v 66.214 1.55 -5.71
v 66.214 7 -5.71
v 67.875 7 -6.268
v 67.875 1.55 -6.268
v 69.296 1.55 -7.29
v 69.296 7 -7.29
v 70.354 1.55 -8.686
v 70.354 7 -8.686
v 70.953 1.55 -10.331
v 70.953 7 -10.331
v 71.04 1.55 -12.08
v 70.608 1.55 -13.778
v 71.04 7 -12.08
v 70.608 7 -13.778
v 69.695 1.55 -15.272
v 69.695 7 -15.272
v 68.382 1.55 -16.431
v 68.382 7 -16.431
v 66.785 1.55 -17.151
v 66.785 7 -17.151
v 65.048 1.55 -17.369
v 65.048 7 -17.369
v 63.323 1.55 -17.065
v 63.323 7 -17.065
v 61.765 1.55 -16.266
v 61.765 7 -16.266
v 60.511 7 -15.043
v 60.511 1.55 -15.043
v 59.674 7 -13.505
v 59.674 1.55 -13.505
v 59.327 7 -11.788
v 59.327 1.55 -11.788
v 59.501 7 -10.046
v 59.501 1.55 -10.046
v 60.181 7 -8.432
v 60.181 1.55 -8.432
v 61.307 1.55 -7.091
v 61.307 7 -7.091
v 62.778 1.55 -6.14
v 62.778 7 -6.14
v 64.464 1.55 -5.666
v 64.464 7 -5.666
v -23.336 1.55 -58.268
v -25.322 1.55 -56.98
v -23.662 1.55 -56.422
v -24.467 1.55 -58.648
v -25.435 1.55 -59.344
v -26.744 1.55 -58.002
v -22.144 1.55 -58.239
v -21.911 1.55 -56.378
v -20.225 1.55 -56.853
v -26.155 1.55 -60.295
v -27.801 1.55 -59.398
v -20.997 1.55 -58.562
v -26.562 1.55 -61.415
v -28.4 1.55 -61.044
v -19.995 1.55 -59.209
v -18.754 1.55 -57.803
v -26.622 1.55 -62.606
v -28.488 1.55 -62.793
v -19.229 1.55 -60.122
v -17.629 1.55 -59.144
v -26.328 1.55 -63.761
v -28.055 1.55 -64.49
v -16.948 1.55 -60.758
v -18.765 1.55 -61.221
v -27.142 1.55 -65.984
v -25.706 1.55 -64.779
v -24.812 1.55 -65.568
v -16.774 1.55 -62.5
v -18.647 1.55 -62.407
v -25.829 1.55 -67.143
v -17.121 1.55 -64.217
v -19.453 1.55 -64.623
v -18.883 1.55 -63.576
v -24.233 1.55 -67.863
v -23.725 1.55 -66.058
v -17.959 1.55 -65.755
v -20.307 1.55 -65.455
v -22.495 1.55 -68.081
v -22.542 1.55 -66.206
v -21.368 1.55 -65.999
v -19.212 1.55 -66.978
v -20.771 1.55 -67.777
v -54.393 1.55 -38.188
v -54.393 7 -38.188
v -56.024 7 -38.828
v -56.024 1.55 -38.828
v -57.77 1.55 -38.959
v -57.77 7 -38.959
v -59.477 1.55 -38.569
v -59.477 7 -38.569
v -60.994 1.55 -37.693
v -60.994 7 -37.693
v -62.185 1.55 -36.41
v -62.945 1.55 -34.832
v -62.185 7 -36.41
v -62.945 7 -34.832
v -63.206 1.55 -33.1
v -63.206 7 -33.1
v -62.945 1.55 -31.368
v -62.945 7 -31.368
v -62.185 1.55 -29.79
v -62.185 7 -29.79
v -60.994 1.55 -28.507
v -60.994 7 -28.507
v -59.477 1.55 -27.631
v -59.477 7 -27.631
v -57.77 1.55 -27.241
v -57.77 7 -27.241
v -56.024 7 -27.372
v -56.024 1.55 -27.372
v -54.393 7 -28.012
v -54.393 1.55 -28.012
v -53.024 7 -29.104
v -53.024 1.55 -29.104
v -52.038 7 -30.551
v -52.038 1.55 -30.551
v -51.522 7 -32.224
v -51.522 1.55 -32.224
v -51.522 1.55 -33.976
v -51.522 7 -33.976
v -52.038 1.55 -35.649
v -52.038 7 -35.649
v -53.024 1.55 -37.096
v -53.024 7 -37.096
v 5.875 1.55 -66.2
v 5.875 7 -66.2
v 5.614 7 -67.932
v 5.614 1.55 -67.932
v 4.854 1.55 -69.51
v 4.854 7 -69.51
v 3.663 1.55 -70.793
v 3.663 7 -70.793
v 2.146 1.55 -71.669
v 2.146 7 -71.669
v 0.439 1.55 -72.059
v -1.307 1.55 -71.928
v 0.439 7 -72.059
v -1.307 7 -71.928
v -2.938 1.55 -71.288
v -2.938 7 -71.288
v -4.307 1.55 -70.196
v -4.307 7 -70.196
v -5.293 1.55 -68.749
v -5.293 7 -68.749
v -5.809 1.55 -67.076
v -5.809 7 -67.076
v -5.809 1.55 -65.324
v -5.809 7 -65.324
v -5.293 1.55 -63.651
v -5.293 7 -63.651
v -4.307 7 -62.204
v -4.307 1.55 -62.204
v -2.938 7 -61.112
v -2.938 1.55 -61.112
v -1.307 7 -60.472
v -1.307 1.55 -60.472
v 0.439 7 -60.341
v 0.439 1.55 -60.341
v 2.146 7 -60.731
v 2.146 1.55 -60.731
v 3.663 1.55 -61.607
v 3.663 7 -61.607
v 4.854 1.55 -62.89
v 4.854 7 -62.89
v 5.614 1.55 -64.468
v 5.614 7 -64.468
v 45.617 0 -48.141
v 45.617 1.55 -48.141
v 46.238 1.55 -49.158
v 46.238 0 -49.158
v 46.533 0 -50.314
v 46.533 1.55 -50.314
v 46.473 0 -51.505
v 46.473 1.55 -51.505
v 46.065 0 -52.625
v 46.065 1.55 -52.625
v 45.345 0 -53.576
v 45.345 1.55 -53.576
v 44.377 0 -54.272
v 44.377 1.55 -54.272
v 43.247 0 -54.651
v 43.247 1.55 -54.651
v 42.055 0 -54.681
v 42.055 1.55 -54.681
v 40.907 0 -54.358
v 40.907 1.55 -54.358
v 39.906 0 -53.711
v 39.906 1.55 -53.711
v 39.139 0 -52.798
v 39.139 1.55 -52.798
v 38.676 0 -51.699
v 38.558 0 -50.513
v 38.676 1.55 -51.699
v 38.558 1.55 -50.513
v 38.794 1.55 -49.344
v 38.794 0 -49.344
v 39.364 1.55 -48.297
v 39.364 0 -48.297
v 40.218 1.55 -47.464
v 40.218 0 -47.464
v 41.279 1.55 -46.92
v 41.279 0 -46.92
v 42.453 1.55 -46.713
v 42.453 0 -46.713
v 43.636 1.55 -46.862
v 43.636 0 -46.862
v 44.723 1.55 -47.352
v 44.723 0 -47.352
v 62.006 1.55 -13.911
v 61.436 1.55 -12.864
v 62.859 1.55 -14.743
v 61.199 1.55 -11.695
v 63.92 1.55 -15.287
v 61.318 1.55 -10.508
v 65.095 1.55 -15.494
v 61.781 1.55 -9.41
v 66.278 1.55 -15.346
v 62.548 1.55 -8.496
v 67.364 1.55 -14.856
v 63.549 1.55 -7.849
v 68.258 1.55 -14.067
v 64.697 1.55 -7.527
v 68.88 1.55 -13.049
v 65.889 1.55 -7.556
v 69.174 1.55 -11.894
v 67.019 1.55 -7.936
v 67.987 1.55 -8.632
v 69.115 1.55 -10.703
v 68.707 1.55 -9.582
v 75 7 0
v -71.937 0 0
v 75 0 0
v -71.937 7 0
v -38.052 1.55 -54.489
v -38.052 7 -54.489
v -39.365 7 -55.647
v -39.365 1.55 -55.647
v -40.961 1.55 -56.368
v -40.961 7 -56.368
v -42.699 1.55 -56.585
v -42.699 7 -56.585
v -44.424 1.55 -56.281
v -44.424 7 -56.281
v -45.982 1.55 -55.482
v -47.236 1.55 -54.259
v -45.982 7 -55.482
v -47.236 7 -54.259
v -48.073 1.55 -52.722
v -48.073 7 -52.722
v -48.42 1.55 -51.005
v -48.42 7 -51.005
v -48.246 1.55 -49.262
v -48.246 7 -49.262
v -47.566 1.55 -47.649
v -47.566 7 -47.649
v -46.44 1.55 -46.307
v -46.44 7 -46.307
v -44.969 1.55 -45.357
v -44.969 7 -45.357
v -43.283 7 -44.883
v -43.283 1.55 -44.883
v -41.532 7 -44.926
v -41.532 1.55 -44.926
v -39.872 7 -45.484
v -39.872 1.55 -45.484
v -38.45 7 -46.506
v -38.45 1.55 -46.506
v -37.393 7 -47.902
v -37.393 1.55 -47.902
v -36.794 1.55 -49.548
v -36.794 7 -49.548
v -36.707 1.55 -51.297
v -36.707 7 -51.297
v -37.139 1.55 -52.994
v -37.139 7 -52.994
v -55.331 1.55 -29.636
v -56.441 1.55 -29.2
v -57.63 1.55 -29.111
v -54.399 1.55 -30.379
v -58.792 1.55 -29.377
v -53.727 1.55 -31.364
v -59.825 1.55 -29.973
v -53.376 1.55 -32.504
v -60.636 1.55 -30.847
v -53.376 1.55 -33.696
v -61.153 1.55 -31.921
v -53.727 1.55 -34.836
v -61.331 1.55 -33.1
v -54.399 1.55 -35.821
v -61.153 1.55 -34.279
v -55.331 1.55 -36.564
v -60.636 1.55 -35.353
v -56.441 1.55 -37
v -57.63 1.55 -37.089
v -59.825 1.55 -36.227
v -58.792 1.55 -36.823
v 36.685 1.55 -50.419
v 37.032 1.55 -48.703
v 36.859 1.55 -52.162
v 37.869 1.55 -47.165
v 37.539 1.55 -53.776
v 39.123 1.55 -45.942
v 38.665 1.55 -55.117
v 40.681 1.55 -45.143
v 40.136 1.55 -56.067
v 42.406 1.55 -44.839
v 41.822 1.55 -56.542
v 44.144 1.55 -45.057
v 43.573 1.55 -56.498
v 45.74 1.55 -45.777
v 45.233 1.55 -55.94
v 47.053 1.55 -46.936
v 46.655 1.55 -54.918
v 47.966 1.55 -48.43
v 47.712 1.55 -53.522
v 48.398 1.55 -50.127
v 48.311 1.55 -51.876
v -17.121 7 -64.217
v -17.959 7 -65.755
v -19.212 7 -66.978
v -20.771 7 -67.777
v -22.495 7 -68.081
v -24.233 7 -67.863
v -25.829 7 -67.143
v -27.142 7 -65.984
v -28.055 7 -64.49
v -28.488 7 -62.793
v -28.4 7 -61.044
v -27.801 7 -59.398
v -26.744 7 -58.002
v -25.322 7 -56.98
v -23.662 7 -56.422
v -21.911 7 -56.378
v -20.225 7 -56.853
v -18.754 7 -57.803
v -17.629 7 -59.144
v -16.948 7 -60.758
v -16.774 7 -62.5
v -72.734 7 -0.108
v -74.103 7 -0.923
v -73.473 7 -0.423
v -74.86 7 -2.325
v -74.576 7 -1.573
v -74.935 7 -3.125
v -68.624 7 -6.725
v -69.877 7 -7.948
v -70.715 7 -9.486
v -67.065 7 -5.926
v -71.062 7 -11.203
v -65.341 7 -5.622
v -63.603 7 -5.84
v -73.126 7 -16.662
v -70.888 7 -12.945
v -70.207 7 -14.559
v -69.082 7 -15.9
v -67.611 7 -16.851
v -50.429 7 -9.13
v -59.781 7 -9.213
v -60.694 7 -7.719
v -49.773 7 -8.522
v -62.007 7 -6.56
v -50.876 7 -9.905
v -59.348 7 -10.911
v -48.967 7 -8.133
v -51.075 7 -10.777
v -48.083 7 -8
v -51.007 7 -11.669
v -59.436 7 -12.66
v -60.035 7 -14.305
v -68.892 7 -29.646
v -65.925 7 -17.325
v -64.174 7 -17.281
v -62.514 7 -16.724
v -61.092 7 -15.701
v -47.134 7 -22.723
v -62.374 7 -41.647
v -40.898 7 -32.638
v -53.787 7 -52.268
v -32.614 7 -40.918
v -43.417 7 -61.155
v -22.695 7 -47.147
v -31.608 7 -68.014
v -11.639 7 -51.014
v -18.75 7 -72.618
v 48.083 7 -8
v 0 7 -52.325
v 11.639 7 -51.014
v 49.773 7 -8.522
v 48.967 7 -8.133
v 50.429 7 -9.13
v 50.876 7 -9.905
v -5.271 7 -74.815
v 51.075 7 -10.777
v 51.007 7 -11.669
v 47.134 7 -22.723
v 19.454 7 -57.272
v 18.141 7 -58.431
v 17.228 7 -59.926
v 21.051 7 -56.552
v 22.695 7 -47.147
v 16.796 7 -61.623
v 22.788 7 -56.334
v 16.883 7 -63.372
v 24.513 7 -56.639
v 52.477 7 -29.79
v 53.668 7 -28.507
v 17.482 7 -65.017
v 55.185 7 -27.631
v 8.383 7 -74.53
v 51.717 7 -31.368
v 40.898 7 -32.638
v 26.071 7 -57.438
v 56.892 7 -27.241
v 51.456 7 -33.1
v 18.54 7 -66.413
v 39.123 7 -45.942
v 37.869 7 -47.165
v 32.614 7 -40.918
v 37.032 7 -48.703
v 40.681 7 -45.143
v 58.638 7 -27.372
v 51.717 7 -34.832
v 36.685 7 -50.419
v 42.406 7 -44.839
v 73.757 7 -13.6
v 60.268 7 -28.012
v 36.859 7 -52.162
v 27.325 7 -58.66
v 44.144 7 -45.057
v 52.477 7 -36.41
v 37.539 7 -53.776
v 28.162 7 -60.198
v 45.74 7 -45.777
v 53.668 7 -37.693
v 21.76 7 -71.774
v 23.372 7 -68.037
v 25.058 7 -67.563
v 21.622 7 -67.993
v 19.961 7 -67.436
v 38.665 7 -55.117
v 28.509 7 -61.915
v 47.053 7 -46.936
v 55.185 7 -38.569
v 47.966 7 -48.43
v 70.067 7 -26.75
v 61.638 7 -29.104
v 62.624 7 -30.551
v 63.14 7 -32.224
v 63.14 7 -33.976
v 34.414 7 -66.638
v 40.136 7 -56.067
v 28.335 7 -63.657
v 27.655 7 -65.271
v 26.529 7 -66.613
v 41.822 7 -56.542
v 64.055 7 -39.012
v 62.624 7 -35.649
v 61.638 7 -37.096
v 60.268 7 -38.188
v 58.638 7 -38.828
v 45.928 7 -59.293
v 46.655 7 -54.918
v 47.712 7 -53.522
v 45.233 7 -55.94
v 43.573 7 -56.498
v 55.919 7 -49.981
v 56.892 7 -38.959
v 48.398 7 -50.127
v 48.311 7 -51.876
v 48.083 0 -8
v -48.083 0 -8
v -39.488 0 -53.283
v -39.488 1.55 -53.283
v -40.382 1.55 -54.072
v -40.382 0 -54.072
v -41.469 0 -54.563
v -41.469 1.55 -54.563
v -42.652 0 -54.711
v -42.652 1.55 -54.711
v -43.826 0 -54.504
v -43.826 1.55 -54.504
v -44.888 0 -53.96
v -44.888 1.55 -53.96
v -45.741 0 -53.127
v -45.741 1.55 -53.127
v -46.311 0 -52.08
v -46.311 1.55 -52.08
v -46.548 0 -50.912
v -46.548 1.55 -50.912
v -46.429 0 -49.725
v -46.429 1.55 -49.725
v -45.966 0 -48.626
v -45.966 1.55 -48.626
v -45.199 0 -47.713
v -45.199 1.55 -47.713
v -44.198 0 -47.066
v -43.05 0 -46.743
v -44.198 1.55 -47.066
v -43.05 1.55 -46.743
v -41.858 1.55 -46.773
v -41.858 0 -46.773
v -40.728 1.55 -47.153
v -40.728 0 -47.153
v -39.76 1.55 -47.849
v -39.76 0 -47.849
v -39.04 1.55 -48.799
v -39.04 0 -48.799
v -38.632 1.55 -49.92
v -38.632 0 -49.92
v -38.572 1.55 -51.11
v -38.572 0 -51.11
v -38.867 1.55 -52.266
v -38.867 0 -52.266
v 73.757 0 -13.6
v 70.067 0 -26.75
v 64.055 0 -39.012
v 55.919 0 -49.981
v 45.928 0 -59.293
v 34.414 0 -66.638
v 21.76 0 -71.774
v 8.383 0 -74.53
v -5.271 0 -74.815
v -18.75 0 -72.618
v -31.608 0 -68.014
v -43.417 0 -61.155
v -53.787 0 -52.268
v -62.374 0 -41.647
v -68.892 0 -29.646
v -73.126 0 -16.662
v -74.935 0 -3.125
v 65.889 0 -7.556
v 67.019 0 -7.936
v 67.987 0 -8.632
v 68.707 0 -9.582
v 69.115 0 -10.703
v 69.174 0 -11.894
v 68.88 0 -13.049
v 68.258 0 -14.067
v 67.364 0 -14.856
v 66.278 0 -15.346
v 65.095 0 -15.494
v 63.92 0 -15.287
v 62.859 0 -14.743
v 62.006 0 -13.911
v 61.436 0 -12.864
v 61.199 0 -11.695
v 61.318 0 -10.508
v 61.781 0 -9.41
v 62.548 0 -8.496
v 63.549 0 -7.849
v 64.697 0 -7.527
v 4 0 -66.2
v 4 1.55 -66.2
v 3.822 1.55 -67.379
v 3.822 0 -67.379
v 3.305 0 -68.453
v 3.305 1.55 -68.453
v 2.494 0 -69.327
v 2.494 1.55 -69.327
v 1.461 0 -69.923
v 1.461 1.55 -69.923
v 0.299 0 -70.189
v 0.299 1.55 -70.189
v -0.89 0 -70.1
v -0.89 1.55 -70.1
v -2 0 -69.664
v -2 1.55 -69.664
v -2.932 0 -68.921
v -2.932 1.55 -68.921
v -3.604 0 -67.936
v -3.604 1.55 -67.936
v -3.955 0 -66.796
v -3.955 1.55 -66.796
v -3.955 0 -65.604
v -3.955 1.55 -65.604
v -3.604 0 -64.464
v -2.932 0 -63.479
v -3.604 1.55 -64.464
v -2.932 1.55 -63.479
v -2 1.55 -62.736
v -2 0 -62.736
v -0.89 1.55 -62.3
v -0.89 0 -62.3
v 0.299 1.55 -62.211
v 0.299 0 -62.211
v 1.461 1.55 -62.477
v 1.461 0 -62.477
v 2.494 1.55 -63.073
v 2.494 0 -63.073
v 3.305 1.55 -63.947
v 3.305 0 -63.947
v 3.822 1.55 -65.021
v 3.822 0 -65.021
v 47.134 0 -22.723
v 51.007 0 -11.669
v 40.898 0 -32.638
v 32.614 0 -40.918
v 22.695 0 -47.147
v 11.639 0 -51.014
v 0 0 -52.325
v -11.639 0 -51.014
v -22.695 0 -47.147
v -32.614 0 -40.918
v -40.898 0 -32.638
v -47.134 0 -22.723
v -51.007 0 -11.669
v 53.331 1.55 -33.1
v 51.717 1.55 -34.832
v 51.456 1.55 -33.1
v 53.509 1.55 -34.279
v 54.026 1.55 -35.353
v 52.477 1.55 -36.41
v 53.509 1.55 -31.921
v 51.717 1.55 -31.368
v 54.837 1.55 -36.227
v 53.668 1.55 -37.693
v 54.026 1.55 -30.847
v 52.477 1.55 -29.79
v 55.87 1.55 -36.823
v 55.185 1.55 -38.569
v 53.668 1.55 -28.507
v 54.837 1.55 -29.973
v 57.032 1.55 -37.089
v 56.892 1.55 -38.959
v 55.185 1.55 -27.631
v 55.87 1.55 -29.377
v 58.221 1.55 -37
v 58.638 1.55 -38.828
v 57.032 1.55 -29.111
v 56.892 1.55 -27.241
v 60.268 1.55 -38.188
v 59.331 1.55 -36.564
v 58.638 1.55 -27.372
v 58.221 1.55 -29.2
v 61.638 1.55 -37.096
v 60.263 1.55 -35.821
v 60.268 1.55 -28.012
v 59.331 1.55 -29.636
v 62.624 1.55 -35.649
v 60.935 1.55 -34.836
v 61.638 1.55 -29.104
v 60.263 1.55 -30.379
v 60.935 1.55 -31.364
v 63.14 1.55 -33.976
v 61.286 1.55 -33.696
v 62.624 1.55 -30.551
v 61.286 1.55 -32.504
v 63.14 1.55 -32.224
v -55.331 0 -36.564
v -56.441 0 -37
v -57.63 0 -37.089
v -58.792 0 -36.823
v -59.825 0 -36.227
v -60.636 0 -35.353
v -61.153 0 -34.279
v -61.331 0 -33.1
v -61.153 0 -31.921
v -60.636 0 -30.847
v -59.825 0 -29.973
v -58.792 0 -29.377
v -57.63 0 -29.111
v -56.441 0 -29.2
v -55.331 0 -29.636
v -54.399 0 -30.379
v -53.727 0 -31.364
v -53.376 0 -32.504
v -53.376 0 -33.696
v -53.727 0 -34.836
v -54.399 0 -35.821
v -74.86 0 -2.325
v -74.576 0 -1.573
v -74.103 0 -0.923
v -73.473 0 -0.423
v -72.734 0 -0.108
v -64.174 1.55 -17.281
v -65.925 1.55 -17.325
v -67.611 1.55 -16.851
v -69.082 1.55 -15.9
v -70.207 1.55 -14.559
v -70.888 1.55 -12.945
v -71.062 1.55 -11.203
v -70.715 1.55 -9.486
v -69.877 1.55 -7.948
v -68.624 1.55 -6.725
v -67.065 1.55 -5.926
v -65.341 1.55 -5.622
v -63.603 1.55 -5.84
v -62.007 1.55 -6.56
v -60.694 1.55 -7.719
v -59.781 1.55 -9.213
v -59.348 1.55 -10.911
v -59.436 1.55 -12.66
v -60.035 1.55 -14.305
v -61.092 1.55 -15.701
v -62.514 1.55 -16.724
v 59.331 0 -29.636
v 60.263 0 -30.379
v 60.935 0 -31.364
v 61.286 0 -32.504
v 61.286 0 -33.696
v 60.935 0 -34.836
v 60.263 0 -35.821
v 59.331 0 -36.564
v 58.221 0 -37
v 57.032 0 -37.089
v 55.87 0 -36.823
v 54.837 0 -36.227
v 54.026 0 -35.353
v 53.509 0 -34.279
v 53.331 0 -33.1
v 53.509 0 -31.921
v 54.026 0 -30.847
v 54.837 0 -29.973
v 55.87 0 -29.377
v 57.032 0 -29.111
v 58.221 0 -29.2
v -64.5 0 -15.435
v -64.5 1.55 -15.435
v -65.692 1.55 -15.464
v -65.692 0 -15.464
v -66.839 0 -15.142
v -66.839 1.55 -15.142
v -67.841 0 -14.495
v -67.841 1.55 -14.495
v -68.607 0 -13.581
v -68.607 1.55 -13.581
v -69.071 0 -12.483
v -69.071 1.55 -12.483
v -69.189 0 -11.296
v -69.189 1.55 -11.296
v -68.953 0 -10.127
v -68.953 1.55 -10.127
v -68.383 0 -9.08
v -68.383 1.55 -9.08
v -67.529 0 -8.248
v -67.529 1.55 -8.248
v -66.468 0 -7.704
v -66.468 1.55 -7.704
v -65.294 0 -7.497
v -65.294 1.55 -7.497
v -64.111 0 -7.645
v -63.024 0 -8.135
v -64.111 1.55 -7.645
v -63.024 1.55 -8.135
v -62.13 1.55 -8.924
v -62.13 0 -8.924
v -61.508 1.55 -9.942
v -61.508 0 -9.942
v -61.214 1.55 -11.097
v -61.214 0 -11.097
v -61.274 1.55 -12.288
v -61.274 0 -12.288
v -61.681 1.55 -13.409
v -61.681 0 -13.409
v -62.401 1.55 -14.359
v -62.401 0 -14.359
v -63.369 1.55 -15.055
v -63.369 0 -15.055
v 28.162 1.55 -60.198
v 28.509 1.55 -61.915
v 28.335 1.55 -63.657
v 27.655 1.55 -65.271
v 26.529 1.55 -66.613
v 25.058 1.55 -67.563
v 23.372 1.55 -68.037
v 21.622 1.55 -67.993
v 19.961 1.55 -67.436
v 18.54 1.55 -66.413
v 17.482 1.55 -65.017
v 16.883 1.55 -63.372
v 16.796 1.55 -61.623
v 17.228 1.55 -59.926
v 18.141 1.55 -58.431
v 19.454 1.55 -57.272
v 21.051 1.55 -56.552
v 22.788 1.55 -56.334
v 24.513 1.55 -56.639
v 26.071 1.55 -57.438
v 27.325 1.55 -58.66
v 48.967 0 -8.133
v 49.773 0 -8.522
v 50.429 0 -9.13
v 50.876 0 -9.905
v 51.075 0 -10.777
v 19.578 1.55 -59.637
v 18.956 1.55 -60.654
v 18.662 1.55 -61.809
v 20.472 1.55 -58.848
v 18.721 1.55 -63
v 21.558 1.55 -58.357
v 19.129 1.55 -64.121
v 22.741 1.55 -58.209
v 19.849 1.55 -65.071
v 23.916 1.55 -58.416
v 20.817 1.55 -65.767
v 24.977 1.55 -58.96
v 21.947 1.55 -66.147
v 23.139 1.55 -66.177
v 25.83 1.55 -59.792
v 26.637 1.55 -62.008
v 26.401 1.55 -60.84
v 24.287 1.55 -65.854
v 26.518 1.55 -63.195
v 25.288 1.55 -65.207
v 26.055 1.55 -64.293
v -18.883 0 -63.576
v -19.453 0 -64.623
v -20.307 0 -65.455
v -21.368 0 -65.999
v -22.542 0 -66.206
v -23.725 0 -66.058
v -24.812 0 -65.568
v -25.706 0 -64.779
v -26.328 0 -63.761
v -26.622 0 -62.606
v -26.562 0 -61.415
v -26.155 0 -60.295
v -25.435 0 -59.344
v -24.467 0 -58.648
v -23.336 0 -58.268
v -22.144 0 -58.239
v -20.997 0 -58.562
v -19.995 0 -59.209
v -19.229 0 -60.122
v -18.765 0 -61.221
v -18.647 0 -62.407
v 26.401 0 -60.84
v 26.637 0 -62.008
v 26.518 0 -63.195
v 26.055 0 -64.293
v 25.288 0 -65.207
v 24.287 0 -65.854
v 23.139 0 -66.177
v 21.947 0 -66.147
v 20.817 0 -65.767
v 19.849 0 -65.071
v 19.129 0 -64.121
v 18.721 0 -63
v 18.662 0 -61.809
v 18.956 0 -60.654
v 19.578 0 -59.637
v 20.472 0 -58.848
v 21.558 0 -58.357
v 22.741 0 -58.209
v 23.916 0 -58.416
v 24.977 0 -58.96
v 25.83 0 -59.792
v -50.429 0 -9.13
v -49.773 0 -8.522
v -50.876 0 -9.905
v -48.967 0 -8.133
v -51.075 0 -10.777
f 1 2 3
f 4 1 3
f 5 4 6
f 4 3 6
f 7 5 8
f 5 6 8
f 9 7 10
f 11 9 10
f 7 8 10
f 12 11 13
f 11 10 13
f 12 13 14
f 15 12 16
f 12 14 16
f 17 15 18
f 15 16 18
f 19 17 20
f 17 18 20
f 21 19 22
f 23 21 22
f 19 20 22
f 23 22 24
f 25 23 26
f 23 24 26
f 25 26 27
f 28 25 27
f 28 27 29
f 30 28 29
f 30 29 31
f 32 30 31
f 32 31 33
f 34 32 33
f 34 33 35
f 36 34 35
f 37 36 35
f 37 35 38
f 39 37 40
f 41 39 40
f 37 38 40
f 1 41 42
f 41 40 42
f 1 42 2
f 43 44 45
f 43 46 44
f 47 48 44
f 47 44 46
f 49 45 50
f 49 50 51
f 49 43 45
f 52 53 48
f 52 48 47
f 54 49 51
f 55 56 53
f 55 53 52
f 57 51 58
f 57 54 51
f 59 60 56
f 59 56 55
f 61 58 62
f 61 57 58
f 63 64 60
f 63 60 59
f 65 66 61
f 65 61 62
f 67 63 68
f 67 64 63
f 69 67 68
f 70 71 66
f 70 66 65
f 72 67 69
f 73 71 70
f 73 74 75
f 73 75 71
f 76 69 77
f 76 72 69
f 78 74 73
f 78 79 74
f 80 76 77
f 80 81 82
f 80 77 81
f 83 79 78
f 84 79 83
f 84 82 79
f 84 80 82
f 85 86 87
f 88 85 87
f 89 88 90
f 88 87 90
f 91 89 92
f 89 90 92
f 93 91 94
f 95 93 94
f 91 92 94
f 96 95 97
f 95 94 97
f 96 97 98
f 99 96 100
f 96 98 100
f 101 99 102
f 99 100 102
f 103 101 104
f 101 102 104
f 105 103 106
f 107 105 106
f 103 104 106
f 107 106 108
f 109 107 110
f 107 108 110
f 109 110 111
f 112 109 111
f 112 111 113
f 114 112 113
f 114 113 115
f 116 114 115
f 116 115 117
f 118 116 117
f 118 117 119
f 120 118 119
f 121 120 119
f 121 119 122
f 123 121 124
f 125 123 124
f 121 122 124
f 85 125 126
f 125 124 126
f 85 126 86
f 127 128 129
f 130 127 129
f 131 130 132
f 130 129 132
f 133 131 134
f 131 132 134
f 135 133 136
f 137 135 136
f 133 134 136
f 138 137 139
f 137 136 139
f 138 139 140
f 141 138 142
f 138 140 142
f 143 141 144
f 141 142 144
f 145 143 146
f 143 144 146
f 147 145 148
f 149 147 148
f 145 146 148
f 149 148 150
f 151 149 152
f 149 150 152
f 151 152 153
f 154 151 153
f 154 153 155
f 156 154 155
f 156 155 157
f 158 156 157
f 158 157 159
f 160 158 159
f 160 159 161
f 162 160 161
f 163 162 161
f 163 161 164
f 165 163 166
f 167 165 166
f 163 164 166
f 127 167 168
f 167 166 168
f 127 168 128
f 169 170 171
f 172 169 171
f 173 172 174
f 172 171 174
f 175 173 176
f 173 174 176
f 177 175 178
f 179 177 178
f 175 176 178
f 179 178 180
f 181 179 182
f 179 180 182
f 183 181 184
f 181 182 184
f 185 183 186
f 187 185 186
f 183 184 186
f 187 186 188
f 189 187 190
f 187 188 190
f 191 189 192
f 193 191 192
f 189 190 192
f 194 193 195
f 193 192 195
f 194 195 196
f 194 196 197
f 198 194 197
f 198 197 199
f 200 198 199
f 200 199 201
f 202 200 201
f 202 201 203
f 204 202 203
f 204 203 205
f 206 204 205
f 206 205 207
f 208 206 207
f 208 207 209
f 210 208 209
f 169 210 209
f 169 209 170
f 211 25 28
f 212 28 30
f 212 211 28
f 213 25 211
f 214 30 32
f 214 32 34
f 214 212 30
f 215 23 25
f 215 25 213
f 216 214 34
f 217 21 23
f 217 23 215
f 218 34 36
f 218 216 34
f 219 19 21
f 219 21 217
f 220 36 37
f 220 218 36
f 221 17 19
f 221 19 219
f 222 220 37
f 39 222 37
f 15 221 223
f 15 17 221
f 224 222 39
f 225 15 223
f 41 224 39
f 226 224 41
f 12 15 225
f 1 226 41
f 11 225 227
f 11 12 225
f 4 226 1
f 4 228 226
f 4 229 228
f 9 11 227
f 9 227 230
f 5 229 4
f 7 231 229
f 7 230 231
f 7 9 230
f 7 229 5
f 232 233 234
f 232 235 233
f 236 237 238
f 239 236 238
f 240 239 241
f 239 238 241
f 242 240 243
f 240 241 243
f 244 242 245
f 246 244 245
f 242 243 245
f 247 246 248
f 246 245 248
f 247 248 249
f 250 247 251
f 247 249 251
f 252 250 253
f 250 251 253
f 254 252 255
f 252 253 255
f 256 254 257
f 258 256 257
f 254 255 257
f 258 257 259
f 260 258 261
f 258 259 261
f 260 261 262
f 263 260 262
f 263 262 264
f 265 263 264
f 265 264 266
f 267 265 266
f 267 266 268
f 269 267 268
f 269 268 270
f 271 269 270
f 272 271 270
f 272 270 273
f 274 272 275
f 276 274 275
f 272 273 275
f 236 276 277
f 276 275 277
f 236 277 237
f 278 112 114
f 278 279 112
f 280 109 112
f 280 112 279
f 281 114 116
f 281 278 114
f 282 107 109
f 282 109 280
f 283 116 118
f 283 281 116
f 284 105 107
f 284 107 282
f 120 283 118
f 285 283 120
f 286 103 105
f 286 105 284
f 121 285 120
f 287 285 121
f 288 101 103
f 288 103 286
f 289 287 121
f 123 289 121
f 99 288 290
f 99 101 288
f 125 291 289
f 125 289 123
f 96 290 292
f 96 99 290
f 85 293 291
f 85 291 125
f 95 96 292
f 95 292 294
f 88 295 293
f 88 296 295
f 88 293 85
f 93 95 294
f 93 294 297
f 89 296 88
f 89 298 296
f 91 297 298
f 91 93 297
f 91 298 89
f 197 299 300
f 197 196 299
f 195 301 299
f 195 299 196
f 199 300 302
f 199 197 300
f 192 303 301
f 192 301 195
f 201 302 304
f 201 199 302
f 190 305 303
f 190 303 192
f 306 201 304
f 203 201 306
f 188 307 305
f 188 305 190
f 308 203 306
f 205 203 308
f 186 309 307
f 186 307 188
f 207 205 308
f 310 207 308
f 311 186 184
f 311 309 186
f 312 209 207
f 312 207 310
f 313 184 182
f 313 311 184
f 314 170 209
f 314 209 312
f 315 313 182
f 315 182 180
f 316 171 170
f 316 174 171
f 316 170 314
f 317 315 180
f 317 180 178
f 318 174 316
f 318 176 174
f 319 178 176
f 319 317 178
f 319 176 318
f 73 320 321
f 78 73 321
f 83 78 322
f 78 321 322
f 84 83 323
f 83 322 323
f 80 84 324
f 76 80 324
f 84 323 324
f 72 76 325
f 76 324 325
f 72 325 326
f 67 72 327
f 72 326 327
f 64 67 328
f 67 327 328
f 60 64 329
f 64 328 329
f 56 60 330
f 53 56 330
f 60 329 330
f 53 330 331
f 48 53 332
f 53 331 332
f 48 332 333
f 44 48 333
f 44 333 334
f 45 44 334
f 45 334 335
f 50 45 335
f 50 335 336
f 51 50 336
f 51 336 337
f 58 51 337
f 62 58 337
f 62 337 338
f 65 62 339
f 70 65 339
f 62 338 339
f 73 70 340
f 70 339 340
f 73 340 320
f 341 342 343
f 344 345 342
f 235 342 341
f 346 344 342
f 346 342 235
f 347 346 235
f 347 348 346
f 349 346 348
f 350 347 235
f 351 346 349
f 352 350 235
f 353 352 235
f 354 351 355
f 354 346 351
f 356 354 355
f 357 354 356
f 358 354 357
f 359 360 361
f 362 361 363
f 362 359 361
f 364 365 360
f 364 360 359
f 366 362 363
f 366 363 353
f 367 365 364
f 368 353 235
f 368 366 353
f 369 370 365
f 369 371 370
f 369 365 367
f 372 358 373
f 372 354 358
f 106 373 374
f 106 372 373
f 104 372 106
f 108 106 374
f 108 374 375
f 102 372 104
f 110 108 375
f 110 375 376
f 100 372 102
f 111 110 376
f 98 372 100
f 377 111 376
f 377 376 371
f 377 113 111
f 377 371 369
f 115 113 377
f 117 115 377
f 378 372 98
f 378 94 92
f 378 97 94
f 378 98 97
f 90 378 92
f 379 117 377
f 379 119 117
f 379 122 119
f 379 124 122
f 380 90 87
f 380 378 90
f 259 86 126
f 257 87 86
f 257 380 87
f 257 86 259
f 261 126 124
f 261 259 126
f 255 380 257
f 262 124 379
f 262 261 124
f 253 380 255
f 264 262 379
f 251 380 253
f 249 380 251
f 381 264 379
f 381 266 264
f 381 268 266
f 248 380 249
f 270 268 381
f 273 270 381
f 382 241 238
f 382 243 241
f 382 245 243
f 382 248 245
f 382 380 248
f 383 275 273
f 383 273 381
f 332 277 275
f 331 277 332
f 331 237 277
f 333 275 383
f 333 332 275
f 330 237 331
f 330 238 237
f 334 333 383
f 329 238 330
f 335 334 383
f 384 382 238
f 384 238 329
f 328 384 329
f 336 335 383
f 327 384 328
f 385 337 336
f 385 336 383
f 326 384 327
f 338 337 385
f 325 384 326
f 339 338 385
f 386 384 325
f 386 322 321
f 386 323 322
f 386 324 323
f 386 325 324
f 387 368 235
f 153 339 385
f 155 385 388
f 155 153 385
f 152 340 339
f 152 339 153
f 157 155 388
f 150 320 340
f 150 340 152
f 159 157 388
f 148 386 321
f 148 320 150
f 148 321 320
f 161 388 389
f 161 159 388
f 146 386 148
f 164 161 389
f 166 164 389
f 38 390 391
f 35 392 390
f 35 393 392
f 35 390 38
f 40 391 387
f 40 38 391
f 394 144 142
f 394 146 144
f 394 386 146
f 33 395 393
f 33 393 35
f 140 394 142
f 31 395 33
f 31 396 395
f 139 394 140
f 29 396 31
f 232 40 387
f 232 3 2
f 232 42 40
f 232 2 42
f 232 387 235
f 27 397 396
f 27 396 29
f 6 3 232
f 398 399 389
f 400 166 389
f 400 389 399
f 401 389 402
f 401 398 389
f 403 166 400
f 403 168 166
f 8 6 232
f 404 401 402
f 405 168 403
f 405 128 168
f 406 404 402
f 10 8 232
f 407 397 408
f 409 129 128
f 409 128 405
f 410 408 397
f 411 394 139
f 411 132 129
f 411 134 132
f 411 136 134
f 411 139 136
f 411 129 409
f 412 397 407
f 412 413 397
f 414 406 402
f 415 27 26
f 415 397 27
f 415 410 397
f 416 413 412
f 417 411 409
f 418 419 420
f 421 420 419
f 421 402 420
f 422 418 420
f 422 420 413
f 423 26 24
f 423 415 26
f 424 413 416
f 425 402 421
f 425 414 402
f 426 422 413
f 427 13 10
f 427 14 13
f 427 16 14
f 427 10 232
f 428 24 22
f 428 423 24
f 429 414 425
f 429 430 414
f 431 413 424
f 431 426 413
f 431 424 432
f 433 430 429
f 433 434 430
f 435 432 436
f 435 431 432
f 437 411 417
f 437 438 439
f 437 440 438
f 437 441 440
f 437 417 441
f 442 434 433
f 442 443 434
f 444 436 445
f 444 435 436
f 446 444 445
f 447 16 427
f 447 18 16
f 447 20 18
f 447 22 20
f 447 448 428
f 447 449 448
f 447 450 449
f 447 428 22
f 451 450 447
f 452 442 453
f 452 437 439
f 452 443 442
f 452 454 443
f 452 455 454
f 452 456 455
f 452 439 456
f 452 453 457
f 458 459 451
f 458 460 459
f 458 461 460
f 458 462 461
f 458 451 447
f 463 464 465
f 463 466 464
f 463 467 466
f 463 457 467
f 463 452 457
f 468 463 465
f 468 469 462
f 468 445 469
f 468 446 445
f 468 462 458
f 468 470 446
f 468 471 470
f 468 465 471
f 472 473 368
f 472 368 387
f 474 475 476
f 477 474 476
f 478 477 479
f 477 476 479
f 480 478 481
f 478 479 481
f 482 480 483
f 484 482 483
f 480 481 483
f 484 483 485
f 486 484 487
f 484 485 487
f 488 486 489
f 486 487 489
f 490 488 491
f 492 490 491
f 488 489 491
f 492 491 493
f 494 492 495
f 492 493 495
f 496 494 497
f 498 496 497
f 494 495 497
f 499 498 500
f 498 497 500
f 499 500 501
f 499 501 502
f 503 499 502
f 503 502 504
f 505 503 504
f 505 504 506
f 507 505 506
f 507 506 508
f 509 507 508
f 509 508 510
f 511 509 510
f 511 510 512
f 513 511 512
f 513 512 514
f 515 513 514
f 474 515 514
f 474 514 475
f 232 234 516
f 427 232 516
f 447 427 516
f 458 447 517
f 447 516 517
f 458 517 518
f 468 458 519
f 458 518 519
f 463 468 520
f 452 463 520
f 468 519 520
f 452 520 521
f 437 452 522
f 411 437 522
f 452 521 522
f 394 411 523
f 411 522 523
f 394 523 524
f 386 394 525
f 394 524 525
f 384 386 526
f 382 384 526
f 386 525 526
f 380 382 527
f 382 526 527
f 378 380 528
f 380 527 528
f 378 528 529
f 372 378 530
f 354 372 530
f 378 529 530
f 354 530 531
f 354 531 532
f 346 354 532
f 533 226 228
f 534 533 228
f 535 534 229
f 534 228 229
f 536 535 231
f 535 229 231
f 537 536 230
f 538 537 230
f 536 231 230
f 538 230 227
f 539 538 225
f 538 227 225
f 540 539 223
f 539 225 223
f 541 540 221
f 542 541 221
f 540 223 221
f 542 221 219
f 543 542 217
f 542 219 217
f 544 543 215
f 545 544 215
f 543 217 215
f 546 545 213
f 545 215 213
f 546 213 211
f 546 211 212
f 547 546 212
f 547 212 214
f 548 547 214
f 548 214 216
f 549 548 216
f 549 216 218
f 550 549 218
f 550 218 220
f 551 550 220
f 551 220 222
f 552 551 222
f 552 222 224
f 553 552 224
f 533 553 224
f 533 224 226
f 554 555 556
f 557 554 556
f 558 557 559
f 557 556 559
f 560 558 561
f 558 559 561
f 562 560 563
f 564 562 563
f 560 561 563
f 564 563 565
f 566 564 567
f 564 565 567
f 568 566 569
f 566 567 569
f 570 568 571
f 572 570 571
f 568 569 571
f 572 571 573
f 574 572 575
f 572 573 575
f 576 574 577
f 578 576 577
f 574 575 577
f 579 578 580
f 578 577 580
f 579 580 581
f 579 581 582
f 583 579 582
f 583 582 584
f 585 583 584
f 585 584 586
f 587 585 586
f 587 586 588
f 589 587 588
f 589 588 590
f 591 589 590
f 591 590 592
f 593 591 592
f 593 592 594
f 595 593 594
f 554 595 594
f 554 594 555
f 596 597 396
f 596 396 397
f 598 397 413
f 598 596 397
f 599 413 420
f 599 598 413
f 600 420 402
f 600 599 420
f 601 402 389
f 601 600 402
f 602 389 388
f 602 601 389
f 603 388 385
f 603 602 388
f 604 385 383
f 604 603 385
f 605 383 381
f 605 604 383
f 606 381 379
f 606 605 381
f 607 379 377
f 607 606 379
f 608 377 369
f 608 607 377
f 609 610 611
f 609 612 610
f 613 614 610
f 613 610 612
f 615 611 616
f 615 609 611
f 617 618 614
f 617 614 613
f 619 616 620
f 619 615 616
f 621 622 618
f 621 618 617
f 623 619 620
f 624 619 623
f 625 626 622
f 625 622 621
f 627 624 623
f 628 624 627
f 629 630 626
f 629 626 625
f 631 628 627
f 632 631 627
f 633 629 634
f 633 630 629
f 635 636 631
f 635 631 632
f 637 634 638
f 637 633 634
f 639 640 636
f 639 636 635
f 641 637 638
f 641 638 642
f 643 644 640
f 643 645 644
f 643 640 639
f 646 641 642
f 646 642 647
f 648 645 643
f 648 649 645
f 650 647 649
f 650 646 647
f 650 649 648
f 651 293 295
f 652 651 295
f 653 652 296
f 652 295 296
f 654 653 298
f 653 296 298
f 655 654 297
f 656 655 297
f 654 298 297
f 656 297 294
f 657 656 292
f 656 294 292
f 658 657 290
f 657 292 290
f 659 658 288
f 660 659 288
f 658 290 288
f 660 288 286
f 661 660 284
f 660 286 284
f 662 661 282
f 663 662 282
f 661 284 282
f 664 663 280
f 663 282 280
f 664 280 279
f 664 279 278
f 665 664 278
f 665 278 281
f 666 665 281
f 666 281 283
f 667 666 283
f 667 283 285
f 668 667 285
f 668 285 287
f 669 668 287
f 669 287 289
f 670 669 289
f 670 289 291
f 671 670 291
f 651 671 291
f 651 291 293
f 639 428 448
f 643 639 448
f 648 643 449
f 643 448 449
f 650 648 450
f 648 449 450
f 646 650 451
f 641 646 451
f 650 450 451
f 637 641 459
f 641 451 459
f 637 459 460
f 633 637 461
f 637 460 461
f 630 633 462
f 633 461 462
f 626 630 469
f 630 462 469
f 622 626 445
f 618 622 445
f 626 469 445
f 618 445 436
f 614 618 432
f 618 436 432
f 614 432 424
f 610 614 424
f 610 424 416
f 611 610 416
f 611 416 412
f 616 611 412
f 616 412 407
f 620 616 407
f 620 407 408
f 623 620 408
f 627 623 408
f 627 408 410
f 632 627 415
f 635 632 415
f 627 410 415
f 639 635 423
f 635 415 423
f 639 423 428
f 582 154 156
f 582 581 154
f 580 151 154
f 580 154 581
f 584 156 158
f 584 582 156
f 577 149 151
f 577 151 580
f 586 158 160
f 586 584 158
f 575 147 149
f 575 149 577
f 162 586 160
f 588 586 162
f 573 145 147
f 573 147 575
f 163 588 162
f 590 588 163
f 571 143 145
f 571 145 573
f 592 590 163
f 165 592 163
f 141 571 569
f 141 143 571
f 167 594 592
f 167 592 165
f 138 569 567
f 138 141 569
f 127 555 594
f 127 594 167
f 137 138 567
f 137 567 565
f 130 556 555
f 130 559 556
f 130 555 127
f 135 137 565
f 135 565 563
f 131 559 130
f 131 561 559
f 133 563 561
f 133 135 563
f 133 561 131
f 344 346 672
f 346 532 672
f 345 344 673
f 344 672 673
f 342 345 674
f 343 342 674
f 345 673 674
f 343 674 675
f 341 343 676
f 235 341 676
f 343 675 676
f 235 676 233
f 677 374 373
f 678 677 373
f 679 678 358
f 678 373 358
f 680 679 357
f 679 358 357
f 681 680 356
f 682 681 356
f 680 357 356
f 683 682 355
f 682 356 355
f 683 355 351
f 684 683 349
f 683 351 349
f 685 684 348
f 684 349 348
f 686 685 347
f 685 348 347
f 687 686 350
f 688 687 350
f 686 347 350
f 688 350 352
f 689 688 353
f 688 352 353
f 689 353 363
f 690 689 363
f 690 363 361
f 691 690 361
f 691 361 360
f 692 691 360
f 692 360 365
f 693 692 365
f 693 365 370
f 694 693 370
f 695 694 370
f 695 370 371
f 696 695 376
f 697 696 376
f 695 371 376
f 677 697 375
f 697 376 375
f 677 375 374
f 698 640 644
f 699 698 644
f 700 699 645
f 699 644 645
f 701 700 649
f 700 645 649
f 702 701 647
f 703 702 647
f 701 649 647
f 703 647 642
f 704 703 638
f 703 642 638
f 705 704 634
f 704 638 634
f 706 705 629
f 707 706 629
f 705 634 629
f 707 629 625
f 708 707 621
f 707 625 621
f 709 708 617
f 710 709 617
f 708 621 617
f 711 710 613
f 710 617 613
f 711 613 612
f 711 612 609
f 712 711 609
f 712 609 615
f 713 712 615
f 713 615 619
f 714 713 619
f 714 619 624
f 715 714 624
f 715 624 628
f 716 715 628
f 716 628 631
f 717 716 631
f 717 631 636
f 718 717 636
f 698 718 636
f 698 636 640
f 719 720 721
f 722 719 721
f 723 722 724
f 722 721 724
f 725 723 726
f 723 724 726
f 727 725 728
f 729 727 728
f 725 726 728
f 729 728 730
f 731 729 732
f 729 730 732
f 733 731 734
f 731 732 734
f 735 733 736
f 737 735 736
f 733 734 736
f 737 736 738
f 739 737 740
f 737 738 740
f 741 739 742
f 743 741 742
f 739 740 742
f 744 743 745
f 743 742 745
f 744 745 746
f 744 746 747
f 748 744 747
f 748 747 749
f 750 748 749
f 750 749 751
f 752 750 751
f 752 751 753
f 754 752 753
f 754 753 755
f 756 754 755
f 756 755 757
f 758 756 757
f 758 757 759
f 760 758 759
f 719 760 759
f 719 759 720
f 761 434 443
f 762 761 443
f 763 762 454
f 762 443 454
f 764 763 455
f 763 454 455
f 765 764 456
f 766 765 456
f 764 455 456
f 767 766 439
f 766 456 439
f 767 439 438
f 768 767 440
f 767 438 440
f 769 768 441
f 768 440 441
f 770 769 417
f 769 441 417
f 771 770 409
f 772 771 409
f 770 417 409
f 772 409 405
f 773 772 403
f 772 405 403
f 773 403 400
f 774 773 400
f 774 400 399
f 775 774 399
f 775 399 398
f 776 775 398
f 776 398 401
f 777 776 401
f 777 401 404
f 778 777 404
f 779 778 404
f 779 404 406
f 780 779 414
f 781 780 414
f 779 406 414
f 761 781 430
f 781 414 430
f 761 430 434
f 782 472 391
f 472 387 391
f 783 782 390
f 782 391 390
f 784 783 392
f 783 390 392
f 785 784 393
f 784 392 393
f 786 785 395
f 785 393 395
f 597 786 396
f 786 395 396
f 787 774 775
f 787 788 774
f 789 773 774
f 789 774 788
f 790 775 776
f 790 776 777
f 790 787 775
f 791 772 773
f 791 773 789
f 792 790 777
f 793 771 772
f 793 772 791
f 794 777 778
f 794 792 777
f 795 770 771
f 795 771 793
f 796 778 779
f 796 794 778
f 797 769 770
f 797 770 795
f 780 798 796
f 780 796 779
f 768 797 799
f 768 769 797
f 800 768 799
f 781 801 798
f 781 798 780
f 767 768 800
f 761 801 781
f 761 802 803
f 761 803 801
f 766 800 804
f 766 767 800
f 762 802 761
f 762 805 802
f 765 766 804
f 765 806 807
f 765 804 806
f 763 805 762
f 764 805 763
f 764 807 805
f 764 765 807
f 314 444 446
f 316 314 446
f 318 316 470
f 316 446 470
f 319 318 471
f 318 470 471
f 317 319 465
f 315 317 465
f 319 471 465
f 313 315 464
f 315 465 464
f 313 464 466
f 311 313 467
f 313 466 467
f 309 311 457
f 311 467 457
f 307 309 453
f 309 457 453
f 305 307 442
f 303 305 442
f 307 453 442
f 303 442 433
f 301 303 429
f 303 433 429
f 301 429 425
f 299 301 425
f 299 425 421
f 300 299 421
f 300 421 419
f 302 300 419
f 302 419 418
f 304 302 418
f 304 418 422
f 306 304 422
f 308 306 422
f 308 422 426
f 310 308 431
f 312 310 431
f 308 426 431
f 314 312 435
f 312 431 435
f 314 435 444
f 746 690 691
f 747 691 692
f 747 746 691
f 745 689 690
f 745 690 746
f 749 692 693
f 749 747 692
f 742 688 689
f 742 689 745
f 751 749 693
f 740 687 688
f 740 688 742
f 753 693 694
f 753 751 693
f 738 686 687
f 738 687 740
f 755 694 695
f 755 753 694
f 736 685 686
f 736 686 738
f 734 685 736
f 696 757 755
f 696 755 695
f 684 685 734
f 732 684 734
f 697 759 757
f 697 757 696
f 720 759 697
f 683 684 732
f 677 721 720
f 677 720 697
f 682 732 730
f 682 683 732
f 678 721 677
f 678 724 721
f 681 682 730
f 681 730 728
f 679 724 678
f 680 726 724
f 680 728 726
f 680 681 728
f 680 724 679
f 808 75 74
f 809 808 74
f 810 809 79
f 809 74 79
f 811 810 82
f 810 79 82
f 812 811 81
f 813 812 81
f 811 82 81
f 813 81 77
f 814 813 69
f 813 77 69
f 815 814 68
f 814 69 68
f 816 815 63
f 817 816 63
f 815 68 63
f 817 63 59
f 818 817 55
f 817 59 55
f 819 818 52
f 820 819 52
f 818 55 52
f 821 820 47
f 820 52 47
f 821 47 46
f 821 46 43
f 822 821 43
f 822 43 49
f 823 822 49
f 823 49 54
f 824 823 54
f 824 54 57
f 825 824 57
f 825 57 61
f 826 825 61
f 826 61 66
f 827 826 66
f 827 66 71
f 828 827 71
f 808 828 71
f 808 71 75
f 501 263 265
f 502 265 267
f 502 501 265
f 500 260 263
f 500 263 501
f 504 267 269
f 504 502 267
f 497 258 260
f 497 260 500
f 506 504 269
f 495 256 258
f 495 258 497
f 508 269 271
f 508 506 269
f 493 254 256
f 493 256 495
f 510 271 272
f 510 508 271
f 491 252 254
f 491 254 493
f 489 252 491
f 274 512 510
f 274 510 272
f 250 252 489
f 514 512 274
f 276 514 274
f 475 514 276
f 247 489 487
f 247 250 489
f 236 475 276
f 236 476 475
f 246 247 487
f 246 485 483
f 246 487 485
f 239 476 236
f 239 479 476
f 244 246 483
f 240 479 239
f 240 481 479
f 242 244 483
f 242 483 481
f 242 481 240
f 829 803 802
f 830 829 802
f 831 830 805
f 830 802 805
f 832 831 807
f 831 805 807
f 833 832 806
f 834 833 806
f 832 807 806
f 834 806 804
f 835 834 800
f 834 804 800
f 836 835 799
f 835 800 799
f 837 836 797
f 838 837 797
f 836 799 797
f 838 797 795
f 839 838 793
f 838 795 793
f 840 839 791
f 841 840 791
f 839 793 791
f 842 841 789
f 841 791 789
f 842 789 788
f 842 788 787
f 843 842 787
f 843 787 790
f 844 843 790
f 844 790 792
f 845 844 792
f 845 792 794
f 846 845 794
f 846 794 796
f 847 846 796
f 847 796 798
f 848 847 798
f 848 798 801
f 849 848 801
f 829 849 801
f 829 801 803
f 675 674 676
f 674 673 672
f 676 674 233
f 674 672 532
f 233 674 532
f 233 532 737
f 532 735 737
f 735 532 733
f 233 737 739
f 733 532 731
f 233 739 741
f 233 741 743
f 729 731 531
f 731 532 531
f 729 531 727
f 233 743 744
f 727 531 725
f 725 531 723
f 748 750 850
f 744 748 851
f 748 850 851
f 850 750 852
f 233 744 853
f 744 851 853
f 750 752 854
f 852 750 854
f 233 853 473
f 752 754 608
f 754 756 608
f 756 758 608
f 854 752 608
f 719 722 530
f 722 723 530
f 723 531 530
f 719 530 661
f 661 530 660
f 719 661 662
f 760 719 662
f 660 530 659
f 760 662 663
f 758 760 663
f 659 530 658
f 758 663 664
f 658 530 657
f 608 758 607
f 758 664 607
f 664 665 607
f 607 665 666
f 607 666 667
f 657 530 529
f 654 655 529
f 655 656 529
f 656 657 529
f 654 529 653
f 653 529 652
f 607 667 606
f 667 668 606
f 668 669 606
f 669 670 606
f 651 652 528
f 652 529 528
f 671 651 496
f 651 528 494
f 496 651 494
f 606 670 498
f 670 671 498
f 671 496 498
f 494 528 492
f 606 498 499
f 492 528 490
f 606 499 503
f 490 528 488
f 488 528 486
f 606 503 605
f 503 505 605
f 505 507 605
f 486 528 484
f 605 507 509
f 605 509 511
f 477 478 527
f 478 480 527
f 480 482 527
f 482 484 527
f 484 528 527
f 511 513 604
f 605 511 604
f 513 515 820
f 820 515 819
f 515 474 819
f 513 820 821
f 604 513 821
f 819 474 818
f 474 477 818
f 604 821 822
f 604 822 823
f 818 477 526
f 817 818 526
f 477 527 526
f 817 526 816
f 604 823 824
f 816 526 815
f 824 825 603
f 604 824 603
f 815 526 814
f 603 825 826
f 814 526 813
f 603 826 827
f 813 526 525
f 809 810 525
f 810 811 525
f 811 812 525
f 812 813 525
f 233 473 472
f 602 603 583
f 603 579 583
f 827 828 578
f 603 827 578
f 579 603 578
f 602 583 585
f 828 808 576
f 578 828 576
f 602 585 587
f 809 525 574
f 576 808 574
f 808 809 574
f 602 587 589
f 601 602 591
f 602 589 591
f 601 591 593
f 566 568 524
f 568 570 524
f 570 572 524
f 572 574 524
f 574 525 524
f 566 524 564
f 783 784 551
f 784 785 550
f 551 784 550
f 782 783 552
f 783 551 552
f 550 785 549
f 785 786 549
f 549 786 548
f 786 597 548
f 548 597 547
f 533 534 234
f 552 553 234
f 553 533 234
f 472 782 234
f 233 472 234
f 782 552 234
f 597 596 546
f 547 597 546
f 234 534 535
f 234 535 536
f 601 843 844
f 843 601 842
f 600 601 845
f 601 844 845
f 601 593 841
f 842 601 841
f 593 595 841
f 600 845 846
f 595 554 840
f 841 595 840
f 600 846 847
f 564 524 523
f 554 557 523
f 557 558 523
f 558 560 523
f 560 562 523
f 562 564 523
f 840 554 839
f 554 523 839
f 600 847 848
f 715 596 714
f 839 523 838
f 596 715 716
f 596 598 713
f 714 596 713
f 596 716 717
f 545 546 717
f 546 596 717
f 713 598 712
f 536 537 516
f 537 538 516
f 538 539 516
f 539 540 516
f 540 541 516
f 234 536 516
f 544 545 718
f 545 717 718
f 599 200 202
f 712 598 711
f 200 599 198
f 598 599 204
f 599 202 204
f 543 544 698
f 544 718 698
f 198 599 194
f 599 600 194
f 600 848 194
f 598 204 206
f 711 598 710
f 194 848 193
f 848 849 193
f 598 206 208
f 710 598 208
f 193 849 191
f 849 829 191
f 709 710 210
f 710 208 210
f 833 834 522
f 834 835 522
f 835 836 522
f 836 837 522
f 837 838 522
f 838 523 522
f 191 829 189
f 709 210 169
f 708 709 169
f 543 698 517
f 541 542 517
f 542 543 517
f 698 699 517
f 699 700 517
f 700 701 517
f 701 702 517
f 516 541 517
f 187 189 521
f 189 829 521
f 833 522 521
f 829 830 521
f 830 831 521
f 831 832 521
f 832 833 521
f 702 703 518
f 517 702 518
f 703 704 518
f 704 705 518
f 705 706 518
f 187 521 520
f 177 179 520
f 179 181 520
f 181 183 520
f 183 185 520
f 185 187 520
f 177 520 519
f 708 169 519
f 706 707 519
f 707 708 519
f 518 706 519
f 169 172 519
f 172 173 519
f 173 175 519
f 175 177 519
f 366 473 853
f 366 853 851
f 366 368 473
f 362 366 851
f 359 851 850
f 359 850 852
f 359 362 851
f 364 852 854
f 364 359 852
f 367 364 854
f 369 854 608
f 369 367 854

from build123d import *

# Parameters (mm, degrees)
SKETCH1_R           = 75
BOSS_EXTRUDE1_DEPTH = 7
SKETCH2_R           = 5.875
CUT_EXTRUDE1_DEPTH  = 5.45
SKETCH3_R           = 4
CUT_EXTRUDE2_DEPTH  = 2.55
CIRPATTERN1_COUNT   = 18
FILLET1_R           = 3


with BuildPart() as part:
    # Sketch1 → Boss-Extrude1 (new body)
    with BuildSketch(Plane(origin=(0, 0, 0), x_dir=(1, 0, 0), z_dir=(0, 1, 0))):
        Circle(SKETCH1_R)
        with BuildLine():
            Line((-51.709821359, 8), (51.709821359, 8))
            ThreePointArc((51.709821359, 8), (0, 52.325), (-51.709821359, 8))
        make_face(mode=Mode.SUBTRACT)
    extrude(amount=BOSS_EXTRUDE1_DEPTH)

    # Sketch2 → Cut-Extrude1 (cut)
    with BuildSketch(Plane(origin=(0, 7, 0), x_dir=(1, 0, 0), z_dir=(0, 1, 0))):
        with Locations((0, 66.2)):
            Circle(SKETCH2_R)
    cut_extrude1 = extrude(amount=-CUT_EXTRUDE1_DEPTH, mode=Mode.SUBTRACT)

    # Sketch3 → Cut-Extrude2 (cut, through all)
    with BuildSketch(Plane(origin=(0, 1.55, 0), x_dir=(1, 0, 0), z_dir=(0, 1, 0))):
        with Locations((0, 66.2)):
            Circle(SKETCH3_R)
    cut_extrude2 = extrude(amount=-CUT_EXTRUDE2_DEPTH, mode=Mode.SUBTRACT)

    # CirPattern1: Cut-Extrude1, Cut-Extrude2 ×18 about axis
    cirpattern1_axis = Axis((0, 0, 0), (0, 1, 0))
    for i in range(1, CIRPATTERN1_COUNT):
        add(cut_extrude1.rotate(cirpattern1_axis, i * 360 / CIRPATTERN1_COUNT), mode=Mode.SUBTRACT)
        add(cut_extrude2.rotate(cirpattern1_axis, i * 360 / CIRPATTERN1_COUNT), mode=Mode.SUBTRACT)

    # Split1
    split(bisect_by=Plane.XY, keep=Keep.BOTTOM)

    # Fillet1
    fillet1_edges = [part.edges().sort_by_distance(p)[0] for p in [
        (51.709821359, 3.5, -8),
        (-51.709821359, 3.5, -8),
        (-75, 3.5, 0),
    ]]
    fillet(fillet1_edges, radius=FILLET1_R)


solid = part.part
